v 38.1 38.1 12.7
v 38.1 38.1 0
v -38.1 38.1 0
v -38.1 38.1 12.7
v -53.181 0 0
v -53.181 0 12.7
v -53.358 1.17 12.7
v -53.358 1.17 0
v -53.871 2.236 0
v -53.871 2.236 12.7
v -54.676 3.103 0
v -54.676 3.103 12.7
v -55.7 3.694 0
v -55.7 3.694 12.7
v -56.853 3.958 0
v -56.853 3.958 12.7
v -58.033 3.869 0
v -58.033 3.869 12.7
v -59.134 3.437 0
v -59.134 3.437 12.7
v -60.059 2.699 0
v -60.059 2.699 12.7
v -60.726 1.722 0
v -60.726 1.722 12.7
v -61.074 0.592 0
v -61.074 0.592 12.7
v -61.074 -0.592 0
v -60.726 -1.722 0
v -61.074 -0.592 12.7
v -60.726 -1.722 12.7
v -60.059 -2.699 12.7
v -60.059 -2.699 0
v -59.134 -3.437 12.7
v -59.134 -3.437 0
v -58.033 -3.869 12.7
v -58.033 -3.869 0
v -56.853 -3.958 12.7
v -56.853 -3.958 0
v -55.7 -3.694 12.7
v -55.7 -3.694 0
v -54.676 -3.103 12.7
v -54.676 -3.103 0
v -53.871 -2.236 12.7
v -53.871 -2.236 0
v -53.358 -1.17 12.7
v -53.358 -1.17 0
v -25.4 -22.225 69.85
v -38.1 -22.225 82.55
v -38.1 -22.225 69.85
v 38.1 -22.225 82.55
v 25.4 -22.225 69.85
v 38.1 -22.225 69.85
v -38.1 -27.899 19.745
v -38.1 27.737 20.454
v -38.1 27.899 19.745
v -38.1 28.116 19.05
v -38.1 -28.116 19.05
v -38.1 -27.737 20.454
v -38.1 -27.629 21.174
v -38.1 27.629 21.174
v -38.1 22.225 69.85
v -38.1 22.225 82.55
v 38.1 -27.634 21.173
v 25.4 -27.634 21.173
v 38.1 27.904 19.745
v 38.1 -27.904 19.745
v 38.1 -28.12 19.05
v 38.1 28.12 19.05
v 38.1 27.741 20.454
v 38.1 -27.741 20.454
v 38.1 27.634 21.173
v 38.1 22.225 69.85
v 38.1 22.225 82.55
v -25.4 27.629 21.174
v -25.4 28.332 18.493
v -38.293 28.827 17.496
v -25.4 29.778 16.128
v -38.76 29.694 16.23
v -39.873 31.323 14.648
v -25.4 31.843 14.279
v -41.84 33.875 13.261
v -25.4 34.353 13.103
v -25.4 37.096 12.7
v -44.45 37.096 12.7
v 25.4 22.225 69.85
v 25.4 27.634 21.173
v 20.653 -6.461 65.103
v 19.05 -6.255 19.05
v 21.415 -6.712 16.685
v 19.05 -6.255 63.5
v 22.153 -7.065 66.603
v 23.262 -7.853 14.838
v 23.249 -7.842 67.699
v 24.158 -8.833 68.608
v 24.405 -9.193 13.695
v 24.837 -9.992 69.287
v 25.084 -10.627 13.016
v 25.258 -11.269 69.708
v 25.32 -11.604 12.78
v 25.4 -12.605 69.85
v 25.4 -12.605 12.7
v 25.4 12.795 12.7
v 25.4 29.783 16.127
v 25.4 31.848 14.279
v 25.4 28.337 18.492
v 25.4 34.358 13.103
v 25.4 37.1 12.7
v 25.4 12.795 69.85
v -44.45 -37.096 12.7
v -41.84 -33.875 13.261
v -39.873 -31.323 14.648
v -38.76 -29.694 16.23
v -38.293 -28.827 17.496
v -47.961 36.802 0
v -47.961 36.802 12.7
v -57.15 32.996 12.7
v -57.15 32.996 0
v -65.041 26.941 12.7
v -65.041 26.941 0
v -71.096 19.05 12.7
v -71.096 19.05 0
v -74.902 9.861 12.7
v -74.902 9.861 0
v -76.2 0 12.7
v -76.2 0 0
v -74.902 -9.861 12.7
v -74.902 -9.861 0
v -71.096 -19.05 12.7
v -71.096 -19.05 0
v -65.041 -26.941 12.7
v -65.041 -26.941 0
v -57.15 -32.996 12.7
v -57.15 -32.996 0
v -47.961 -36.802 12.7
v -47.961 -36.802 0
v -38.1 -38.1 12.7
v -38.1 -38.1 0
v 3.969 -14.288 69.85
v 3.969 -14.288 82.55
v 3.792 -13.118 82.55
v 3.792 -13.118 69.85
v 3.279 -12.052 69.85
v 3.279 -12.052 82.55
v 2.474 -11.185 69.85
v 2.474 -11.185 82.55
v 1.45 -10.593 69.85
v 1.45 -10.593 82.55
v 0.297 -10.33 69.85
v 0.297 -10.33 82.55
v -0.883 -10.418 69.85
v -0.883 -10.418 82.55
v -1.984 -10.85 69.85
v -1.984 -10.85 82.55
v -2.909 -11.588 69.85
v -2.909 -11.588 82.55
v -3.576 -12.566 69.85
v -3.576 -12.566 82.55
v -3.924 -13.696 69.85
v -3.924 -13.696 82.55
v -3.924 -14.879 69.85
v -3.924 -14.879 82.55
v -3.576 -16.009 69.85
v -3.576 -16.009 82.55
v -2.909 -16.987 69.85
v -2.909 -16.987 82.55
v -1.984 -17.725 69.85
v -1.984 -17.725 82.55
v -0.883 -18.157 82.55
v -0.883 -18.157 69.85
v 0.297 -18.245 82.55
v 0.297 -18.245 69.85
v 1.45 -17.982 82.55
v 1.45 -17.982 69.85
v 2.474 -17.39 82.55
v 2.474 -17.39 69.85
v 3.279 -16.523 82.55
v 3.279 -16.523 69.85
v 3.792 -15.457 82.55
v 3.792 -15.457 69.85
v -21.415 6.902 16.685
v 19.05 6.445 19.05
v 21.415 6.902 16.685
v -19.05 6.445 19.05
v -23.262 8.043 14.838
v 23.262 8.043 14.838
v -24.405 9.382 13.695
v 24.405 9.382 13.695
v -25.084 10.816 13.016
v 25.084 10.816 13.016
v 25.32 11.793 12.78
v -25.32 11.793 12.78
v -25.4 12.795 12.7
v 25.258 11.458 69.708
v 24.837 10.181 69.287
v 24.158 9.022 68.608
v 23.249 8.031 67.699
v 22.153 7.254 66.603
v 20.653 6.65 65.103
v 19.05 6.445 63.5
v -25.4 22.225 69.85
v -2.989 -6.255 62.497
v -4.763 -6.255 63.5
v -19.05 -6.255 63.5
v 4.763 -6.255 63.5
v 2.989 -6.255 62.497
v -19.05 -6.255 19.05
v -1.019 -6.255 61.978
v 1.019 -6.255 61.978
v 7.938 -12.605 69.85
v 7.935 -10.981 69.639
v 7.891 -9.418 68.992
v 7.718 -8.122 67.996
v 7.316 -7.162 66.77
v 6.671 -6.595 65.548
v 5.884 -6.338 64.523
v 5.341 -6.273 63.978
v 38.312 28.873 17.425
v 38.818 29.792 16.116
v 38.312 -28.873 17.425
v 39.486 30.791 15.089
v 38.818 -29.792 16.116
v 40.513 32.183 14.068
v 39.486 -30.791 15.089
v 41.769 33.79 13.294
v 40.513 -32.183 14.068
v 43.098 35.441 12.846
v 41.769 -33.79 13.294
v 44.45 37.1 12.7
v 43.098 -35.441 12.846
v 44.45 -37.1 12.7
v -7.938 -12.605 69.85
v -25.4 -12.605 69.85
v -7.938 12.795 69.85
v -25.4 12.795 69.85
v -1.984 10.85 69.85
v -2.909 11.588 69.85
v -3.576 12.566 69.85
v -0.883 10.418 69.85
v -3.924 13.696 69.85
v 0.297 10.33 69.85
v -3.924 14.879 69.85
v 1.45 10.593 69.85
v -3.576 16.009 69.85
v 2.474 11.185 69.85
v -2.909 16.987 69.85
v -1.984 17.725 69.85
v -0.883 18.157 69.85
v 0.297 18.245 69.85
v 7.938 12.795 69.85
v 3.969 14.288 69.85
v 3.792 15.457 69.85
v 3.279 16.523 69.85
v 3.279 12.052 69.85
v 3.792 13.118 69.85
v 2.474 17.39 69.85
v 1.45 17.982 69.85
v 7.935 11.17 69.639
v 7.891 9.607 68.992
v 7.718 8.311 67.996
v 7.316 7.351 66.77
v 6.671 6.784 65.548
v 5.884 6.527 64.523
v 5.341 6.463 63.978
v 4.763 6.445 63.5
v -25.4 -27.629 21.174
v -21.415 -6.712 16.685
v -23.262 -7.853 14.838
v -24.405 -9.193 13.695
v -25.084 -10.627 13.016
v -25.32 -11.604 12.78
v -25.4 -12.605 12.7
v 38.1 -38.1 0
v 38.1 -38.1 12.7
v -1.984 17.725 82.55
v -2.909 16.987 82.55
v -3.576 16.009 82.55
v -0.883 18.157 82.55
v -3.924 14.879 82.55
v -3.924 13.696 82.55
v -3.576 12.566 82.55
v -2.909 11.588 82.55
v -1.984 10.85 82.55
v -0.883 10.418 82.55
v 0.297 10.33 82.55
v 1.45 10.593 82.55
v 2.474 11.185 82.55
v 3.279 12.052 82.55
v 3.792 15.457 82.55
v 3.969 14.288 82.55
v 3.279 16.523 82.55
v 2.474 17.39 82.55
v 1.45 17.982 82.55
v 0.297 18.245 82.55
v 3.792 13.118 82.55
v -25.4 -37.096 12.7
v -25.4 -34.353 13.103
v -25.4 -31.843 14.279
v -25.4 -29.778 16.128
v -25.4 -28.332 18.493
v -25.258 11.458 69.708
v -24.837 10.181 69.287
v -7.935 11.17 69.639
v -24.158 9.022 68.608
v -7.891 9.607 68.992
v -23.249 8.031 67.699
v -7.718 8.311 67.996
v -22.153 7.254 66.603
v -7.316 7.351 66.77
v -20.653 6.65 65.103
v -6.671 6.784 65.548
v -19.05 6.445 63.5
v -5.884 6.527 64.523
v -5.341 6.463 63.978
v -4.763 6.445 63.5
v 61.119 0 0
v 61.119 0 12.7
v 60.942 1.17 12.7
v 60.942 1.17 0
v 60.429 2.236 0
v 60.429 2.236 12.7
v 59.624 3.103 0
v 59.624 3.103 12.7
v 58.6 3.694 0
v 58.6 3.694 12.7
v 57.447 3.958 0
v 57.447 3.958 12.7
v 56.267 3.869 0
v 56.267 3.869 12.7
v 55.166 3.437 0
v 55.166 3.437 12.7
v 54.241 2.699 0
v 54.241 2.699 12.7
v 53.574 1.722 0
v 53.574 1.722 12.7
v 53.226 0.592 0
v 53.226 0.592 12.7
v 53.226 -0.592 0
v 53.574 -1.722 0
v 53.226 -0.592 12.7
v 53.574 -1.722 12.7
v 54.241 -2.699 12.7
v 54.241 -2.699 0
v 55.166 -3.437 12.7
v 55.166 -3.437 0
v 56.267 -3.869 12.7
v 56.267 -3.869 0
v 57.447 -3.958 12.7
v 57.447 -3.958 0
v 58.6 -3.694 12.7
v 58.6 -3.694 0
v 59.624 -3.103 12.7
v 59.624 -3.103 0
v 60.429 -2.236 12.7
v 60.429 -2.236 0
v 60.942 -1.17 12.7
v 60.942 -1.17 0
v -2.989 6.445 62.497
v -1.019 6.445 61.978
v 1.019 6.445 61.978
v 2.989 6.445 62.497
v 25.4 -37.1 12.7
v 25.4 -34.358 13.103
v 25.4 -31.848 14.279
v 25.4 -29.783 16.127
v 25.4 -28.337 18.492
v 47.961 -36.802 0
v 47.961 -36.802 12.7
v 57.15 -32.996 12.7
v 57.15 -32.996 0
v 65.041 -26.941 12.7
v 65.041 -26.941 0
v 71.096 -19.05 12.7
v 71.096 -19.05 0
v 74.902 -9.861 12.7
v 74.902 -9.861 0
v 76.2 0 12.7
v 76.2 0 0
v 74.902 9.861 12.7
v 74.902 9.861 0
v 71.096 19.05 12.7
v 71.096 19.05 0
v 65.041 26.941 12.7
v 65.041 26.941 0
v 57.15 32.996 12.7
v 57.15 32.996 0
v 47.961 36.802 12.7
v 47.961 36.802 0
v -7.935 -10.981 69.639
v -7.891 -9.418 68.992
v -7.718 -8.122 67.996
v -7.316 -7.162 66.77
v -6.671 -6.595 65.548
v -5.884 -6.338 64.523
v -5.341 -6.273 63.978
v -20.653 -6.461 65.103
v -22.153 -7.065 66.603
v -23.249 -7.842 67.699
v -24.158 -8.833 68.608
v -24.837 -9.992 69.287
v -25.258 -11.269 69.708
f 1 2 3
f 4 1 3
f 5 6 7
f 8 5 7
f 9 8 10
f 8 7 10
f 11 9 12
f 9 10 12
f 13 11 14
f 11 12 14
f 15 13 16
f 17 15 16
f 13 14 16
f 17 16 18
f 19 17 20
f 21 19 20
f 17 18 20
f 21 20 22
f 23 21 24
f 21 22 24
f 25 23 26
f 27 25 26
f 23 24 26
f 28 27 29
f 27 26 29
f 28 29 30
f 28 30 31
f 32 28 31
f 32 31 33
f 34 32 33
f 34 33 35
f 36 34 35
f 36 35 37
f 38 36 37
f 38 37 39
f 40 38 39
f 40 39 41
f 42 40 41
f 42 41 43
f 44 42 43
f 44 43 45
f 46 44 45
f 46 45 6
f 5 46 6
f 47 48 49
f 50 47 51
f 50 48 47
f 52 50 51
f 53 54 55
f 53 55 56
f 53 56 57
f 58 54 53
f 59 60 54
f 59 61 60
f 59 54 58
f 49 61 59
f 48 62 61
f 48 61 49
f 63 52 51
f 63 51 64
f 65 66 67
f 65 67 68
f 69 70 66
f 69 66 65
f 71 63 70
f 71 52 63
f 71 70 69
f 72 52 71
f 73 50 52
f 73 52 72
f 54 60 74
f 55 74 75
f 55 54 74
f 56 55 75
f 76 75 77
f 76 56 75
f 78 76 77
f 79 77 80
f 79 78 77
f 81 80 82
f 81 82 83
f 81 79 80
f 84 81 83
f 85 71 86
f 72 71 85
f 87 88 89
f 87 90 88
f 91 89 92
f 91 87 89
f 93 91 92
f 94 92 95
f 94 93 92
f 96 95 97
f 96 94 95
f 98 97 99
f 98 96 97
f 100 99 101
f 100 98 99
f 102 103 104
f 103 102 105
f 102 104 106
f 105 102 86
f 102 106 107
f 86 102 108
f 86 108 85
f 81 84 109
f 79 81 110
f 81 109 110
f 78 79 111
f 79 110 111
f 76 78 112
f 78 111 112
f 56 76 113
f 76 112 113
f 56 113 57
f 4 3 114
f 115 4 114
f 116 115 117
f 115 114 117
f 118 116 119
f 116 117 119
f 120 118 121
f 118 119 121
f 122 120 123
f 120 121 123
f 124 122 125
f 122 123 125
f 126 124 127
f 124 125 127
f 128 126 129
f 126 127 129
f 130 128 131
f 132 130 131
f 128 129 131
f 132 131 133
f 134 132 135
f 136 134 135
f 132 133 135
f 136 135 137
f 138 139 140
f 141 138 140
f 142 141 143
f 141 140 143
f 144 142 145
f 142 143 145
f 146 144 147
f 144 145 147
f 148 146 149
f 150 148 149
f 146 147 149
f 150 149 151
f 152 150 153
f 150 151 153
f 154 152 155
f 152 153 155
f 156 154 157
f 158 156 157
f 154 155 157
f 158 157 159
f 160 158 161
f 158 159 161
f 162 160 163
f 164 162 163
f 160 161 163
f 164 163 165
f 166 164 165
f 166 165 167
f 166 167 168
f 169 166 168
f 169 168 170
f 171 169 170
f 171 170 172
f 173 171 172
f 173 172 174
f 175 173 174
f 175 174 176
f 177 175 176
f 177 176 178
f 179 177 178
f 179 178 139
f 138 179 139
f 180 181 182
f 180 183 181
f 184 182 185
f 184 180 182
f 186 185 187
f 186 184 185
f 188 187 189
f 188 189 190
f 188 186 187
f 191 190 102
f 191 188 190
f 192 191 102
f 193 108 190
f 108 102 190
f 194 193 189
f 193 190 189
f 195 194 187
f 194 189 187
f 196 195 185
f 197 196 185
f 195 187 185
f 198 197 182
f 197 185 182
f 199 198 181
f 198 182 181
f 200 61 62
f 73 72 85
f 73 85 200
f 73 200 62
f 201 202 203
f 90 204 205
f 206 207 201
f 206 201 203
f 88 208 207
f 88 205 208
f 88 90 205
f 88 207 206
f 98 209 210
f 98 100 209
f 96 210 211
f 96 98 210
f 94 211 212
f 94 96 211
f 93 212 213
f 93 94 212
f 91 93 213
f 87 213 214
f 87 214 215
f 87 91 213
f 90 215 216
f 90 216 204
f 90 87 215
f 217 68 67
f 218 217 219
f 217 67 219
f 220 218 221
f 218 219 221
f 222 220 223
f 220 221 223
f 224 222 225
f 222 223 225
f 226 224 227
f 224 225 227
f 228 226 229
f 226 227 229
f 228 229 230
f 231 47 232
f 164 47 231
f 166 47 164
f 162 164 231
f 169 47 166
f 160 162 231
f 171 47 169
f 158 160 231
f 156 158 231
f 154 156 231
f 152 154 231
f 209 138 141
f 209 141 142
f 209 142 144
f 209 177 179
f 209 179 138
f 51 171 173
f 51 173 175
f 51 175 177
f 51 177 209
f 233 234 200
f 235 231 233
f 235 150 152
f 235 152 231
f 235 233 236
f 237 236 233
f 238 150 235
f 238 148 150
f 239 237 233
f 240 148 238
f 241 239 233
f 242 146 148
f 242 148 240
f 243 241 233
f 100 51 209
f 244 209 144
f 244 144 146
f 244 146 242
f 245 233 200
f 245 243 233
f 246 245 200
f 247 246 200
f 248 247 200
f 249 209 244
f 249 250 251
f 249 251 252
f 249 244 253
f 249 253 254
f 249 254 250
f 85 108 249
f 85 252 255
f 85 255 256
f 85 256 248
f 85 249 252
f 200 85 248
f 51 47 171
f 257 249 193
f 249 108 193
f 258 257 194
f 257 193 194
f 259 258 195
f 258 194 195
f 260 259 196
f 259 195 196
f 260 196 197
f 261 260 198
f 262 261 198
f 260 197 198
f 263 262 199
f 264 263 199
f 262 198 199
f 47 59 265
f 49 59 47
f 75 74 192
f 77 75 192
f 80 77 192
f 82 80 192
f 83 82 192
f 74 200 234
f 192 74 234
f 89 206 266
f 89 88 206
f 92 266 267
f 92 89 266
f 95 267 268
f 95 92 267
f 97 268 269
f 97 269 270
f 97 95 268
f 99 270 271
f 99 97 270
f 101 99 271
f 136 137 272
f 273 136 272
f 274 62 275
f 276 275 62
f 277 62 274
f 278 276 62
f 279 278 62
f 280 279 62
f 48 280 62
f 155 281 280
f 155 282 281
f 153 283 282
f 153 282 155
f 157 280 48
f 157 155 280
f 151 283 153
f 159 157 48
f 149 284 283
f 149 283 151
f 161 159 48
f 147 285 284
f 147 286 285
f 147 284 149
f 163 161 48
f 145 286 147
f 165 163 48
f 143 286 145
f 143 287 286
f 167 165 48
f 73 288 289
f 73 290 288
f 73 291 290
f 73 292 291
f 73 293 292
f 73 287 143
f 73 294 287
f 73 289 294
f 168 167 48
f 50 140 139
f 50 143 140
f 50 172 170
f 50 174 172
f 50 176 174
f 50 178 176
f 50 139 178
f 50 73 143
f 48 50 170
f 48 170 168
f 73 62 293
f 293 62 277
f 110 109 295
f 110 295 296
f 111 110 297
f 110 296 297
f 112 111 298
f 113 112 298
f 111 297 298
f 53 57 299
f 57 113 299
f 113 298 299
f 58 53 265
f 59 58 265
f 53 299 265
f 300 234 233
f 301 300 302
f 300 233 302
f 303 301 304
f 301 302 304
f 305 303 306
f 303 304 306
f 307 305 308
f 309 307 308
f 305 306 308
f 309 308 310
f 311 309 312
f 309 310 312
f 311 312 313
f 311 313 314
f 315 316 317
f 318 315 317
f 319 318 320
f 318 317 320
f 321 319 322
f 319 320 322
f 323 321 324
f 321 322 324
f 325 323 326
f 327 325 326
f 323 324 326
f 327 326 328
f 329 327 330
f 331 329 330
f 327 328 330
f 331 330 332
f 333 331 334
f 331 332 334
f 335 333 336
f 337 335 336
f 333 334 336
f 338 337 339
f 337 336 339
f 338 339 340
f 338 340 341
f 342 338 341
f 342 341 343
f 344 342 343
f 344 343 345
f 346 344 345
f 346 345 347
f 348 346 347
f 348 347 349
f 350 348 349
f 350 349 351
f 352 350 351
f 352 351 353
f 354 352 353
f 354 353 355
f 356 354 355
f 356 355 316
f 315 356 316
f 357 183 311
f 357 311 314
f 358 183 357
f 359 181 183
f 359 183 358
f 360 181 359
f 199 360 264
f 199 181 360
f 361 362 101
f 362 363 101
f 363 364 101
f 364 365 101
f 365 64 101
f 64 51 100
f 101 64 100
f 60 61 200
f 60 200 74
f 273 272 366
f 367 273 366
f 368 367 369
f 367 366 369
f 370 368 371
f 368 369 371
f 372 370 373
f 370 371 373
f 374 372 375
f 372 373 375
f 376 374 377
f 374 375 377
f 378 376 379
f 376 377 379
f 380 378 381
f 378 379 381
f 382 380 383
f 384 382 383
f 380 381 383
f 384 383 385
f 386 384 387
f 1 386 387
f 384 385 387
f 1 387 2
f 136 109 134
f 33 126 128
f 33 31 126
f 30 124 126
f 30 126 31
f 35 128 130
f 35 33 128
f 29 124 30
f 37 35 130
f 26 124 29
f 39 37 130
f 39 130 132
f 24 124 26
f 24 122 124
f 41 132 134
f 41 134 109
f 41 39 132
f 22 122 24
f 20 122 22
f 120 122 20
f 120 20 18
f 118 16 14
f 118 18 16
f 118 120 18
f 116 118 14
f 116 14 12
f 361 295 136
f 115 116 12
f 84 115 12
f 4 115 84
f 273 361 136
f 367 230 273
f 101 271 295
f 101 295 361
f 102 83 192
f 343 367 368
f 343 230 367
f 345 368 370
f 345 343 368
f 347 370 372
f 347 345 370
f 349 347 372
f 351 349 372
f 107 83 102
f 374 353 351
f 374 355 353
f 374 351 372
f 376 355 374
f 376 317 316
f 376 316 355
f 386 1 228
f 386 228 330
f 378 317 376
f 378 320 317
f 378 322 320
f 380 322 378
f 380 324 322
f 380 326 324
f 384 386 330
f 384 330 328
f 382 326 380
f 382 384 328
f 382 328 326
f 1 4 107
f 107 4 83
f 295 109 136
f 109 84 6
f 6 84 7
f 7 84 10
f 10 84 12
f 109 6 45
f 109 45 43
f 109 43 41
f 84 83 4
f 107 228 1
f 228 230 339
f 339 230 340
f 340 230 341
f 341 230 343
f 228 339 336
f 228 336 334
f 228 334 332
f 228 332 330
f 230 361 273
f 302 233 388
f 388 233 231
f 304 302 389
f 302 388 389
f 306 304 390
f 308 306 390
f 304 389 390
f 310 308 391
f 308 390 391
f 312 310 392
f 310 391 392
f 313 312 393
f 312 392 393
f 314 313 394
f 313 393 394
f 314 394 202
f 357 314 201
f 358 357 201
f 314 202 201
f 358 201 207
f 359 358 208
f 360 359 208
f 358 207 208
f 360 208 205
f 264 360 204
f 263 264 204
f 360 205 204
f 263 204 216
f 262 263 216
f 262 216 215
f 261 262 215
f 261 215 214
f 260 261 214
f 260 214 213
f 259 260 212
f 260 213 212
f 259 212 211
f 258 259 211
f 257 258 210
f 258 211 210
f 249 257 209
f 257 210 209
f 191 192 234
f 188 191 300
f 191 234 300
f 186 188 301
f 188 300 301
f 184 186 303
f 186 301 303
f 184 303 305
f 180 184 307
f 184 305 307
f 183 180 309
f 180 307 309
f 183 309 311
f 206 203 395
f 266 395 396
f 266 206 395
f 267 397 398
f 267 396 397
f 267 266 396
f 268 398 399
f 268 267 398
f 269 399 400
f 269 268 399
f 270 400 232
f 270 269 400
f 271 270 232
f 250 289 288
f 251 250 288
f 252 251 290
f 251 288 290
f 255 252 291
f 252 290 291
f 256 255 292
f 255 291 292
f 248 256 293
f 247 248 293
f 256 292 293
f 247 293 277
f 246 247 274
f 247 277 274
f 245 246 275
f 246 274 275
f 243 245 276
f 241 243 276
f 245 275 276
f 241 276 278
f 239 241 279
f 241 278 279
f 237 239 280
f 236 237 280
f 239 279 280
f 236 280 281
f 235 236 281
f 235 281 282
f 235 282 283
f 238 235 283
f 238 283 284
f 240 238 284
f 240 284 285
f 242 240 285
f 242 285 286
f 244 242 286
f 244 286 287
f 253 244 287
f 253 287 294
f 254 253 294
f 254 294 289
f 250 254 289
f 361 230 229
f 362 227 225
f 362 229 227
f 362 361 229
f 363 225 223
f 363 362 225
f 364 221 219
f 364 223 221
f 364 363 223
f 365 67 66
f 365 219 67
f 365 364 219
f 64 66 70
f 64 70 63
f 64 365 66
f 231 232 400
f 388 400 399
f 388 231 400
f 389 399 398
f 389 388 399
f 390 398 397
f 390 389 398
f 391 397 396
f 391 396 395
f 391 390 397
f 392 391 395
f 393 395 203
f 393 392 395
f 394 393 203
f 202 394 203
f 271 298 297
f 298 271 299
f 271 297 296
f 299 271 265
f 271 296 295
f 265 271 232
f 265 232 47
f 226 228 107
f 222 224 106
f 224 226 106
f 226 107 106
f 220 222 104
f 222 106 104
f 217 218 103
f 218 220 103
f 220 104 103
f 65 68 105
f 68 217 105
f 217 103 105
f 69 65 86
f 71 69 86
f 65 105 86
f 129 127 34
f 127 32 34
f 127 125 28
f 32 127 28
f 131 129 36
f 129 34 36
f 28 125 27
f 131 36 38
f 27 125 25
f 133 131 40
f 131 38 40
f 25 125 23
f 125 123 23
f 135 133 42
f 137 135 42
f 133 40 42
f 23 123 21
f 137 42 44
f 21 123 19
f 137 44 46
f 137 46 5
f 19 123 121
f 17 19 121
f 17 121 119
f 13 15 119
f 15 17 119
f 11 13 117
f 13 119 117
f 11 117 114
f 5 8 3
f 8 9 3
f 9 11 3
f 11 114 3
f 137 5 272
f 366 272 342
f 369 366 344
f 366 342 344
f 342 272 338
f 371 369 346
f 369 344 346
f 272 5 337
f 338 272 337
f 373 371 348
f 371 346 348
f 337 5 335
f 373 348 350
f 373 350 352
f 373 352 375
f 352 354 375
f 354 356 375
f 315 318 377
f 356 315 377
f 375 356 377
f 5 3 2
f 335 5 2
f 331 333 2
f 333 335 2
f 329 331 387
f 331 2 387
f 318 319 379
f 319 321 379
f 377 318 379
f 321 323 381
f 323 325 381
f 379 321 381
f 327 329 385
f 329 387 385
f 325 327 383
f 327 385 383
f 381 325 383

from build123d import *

# Parameters (mm, degrees)
F1_DEPTH  = 12.7
F3_DEPTH  = 38.1
F5_DEPTH  = 25.4
F7_DEPTH  = 12.7
F9_DEPTH  = 12.7
F10_R     = 3.96875
F11_DEPTH = 25.4
F12_DEPTH = 82.551
F13_R     = 9.525
F14_R     = 6.35


# Not quite as in the source:
# - a length typed as a fraction of an inch, garbled in the dataset ("3 / 203.2 mm" for 3/8 in), is restored


with BuildPart() as f1:
    # F0 (on Top) → F1 (new body)
    with BuildSketch(Plane.XY):
        with BuildLine():
            Line((-38.1, -38.1), (38.1, -38.1))
            ThreePointArc((38.1, -38.1), (76.2, 0), (38.1, 38.1))
            Line((38.1, 38.1), (-38.1, 38.1))
            ThreePointArc((-38.1, 38.1), (-76.2, 0), (-38.1, -38.1))
        make_face()
    extrude(amount=F1_DEPTH)

    # F2 (on Right) → F3 (join, symmetric)
    with BuildSketch(Plane.YZ):
        Polygon((6.4445460903, 82.55), (0, 82.55), (-6.2554539097, 82.55), (-22.225, 82.55), (-22.225, 69.85), (-6.2554539097, 69.85), (-6.2554539097, 0), (6.4445460903, 0), (6.4445460903, 69.85), (22.225, 69.85), (22.225, 82.55), align=None)
    extrude(amount=F3_DEPTH, both=True)

    # F4 (on face) → F5 (cut)
    with BuildSketch(Plane.XZ.offset(6.2554539097)):
        with BuildLine():
            Line((7.9375, 69.85), (-7.9375, 69.85))
            ThreePointArc((-7.9375, 69.85), (0, 61.9125), (7.9375, 69.85))
        make_face()
    extrude(amount=-F5_DEPTH, mode=Mode.SUBTRACT)

    # F6 (on face) → F7 (join)
    with BuildSketch(Plane.YZ.offset(38.1)):
        Polygon((-28.575, 12.7), (28.575, 12.7), (22.225, 69.85), (-22.225, 69.85), align=None)
    extrude(amount=-F7_DEPTH)

    # F8 (on face) → F9 (join)
    with BuildSketch(Plane(origin=(-38.1, 0, 0), x_dir=(0, -1, 0), z_dir=(-1, 0, 0))):
        Polygon((-22.225, 69.85), (-28.575, 12.6521781883), (28.575, 12.6521781883), (22.225, 69.85), align=None)
    extrude(amount=-F9_DEPTH)

    # F10 (on face) → F11 (cut)
    with BuildSketch(Plane.XY.offset(82.55)):
        with Locations((0, 14.2875)):
            Circle(F10_R)
        with Locations((0, -14.2875)):
            Circle(F10_R)
    extrude(amount=-F11_DEPTH, mode=Mode.SUBTRACT)

    # F10 (on face) → F12 (cut, through all)
    with BuildSketch(Plane.XY.offset(82.55)):
        with Locations((-57.15, 0)):
            Circle(F10_R)
        with Locations((57.15, 0)):
            Circle(F10_R)
    extrude(amount=-F12_DEPTH, mode=Mode.SUBTRACT)

    # F13
    f13_edges = [f1.edges().sort_by_distance(p)[0] for p in [
        (31.75, -28.575, 12.7),
        (31.75, 28.575, 12.7),
        (-31.75, -28.569691, 12.7),
        (-31.75, 28.569691, 12.7),
    ]]
    fillet(f13_edges, radius=F13_R)

    # F14
    f14_edges = [f1.edges().sort_by_distance(p)[0] for p in [
        (0, 6.444546, 12.7),
        (0, -6.255454, 12.7),
        (-16.66875, -6.255454, 69.85),
        (16.66875, -6.255454, 69.85),
        (-16.66875, 6.444546, 69.85),
        (16.66875, 6.444546, 69.85),
        (38.1, 0, 12.7),
        (-38.1, 0, 12.7),
        (-25.4, 6.444546, 41.275),
        (25.4, 6.444546, 41.275),
        (-25.4, -6.255454, 41.275),
        (25.4, -6.255454, 41.275),
    ]]
    fillet(f14_edges, radius=F14_R)


solid = f1.part
